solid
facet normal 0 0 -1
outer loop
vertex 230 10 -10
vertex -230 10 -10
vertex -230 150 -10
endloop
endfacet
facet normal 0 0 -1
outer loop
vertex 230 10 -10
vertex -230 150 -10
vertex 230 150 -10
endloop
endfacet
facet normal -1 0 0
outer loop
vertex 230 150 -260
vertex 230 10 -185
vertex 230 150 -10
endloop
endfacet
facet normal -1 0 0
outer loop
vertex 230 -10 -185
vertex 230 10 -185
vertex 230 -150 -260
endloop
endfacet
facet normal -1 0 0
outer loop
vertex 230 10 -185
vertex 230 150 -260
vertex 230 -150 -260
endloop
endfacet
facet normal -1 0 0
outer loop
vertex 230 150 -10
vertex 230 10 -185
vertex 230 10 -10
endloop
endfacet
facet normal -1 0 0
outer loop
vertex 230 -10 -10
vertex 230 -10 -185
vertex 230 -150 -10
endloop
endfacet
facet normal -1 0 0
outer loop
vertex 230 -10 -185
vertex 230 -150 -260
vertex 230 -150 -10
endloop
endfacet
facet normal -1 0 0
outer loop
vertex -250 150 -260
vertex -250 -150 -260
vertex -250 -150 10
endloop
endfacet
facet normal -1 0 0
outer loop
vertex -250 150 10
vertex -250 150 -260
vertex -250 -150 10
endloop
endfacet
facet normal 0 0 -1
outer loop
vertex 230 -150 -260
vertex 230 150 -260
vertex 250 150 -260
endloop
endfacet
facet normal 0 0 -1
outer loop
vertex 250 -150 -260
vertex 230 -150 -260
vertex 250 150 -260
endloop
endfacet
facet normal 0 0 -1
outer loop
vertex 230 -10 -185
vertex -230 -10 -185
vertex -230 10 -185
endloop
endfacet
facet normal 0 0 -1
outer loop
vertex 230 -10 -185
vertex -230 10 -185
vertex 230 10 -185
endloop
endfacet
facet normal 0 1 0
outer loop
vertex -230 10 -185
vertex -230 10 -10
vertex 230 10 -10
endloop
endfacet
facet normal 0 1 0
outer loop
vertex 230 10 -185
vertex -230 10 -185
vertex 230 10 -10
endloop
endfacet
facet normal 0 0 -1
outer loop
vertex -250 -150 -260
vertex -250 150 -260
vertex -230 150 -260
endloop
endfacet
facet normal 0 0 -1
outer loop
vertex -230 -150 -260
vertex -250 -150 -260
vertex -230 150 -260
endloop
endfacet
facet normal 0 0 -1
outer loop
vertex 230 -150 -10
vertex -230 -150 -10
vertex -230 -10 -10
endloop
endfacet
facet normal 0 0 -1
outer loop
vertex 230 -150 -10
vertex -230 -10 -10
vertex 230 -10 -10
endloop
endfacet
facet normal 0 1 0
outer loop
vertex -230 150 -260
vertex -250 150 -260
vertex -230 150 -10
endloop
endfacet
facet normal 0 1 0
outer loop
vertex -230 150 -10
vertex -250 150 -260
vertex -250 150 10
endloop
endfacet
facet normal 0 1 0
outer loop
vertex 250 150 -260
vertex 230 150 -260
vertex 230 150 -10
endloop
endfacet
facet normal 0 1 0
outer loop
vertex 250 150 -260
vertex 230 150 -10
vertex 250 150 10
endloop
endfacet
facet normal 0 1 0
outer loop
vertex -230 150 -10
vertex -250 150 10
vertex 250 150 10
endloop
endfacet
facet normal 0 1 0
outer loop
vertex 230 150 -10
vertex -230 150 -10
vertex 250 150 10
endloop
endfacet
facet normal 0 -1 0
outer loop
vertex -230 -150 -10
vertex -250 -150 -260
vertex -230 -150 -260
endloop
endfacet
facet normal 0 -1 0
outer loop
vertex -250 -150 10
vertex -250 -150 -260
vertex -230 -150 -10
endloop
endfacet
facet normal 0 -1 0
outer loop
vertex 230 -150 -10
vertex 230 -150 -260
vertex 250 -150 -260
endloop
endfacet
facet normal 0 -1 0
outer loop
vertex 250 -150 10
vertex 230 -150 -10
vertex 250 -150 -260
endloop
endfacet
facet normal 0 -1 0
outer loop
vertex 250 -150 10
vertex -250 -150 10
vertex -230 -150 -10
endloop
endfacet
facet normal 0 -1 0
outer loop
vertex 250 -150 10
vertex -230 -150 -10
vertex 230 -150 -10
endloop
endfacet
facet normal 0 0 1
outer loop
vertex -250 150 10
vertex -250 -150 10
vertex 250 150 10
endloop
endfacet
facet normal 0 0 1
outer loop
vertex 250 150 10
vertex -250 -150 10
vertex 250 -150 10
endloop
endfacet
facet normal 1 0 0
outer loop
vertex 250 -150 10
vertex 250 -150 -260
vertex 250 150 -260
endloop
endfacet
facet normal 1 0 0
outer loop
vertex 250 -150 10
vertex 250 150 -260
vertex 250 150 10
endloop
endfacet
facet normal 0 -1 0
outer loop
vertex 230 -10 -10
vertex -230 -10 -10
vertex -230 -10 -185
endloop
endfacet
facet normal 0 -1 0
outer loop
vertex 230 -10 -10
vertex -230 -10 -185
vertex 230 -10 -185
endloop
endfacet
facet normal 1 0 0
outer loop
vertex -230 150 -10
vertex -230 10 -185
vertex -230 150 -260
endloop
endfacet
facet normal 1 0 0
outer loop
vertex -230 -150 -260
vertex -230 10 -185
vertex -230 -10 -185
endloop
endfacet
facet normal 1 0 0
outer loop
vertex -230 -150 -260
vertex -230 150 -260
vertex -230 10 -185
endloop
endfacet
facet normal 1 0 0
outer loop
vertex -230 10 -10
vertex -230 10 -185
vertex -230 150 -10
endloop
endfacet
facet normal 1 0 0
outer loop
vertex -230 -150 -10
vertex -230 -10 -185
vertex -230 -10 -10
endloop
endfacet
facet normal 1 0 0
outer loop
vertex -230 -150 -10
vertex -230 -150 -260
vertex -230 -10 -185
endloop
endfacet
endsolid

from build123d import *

# Parameters (mm, degrees)
F0_W     = 500
F0_H     = 20
F4_DEPTH = 150
F1_W     = 20
F1_H     = 250
F5_DEPTH = 150
F2_W     = 20
F2_H     = 250
F6_DEPTH = 150
F3_W     = 460
F3_H     = 175
F7_DEPTH = 10


with BuildPart() as f4:
    # F0 (on Front) → F4 (new body, symmetric)
    with BuildSketch(Plane.XZ):
        Rectangle(F0_W, F0_H)
    extrude(amount=F4_DEPTH, both=True)

    # F1 (on Front) → F5 (join, symmetric)
    with BuildSketch(Plane.XZ):
        with Locations((-240, -135)):
            Rectangle(F1_W, F1_H)
    extrude(amount=F5_DEPTH, both=True)

    # F2 (on Front) → F6 (join, symmetric)
    with BuildSketch(Plane.XZ):
        with Locations((240, -135)):
            Rectangle(F2_W, F2_H)
    extrude(amount=F6_DEPTH, both=True)

    # F3 (on Front) → F7 (join, symmetric)
    with BuildSketch(Plane.XZ):
        with Locations((0, -97.5)):
            Rectangle(F3_W, F3_H)
    extrude(amount=F7_DEPTH, both=True)


solid = f4.part
